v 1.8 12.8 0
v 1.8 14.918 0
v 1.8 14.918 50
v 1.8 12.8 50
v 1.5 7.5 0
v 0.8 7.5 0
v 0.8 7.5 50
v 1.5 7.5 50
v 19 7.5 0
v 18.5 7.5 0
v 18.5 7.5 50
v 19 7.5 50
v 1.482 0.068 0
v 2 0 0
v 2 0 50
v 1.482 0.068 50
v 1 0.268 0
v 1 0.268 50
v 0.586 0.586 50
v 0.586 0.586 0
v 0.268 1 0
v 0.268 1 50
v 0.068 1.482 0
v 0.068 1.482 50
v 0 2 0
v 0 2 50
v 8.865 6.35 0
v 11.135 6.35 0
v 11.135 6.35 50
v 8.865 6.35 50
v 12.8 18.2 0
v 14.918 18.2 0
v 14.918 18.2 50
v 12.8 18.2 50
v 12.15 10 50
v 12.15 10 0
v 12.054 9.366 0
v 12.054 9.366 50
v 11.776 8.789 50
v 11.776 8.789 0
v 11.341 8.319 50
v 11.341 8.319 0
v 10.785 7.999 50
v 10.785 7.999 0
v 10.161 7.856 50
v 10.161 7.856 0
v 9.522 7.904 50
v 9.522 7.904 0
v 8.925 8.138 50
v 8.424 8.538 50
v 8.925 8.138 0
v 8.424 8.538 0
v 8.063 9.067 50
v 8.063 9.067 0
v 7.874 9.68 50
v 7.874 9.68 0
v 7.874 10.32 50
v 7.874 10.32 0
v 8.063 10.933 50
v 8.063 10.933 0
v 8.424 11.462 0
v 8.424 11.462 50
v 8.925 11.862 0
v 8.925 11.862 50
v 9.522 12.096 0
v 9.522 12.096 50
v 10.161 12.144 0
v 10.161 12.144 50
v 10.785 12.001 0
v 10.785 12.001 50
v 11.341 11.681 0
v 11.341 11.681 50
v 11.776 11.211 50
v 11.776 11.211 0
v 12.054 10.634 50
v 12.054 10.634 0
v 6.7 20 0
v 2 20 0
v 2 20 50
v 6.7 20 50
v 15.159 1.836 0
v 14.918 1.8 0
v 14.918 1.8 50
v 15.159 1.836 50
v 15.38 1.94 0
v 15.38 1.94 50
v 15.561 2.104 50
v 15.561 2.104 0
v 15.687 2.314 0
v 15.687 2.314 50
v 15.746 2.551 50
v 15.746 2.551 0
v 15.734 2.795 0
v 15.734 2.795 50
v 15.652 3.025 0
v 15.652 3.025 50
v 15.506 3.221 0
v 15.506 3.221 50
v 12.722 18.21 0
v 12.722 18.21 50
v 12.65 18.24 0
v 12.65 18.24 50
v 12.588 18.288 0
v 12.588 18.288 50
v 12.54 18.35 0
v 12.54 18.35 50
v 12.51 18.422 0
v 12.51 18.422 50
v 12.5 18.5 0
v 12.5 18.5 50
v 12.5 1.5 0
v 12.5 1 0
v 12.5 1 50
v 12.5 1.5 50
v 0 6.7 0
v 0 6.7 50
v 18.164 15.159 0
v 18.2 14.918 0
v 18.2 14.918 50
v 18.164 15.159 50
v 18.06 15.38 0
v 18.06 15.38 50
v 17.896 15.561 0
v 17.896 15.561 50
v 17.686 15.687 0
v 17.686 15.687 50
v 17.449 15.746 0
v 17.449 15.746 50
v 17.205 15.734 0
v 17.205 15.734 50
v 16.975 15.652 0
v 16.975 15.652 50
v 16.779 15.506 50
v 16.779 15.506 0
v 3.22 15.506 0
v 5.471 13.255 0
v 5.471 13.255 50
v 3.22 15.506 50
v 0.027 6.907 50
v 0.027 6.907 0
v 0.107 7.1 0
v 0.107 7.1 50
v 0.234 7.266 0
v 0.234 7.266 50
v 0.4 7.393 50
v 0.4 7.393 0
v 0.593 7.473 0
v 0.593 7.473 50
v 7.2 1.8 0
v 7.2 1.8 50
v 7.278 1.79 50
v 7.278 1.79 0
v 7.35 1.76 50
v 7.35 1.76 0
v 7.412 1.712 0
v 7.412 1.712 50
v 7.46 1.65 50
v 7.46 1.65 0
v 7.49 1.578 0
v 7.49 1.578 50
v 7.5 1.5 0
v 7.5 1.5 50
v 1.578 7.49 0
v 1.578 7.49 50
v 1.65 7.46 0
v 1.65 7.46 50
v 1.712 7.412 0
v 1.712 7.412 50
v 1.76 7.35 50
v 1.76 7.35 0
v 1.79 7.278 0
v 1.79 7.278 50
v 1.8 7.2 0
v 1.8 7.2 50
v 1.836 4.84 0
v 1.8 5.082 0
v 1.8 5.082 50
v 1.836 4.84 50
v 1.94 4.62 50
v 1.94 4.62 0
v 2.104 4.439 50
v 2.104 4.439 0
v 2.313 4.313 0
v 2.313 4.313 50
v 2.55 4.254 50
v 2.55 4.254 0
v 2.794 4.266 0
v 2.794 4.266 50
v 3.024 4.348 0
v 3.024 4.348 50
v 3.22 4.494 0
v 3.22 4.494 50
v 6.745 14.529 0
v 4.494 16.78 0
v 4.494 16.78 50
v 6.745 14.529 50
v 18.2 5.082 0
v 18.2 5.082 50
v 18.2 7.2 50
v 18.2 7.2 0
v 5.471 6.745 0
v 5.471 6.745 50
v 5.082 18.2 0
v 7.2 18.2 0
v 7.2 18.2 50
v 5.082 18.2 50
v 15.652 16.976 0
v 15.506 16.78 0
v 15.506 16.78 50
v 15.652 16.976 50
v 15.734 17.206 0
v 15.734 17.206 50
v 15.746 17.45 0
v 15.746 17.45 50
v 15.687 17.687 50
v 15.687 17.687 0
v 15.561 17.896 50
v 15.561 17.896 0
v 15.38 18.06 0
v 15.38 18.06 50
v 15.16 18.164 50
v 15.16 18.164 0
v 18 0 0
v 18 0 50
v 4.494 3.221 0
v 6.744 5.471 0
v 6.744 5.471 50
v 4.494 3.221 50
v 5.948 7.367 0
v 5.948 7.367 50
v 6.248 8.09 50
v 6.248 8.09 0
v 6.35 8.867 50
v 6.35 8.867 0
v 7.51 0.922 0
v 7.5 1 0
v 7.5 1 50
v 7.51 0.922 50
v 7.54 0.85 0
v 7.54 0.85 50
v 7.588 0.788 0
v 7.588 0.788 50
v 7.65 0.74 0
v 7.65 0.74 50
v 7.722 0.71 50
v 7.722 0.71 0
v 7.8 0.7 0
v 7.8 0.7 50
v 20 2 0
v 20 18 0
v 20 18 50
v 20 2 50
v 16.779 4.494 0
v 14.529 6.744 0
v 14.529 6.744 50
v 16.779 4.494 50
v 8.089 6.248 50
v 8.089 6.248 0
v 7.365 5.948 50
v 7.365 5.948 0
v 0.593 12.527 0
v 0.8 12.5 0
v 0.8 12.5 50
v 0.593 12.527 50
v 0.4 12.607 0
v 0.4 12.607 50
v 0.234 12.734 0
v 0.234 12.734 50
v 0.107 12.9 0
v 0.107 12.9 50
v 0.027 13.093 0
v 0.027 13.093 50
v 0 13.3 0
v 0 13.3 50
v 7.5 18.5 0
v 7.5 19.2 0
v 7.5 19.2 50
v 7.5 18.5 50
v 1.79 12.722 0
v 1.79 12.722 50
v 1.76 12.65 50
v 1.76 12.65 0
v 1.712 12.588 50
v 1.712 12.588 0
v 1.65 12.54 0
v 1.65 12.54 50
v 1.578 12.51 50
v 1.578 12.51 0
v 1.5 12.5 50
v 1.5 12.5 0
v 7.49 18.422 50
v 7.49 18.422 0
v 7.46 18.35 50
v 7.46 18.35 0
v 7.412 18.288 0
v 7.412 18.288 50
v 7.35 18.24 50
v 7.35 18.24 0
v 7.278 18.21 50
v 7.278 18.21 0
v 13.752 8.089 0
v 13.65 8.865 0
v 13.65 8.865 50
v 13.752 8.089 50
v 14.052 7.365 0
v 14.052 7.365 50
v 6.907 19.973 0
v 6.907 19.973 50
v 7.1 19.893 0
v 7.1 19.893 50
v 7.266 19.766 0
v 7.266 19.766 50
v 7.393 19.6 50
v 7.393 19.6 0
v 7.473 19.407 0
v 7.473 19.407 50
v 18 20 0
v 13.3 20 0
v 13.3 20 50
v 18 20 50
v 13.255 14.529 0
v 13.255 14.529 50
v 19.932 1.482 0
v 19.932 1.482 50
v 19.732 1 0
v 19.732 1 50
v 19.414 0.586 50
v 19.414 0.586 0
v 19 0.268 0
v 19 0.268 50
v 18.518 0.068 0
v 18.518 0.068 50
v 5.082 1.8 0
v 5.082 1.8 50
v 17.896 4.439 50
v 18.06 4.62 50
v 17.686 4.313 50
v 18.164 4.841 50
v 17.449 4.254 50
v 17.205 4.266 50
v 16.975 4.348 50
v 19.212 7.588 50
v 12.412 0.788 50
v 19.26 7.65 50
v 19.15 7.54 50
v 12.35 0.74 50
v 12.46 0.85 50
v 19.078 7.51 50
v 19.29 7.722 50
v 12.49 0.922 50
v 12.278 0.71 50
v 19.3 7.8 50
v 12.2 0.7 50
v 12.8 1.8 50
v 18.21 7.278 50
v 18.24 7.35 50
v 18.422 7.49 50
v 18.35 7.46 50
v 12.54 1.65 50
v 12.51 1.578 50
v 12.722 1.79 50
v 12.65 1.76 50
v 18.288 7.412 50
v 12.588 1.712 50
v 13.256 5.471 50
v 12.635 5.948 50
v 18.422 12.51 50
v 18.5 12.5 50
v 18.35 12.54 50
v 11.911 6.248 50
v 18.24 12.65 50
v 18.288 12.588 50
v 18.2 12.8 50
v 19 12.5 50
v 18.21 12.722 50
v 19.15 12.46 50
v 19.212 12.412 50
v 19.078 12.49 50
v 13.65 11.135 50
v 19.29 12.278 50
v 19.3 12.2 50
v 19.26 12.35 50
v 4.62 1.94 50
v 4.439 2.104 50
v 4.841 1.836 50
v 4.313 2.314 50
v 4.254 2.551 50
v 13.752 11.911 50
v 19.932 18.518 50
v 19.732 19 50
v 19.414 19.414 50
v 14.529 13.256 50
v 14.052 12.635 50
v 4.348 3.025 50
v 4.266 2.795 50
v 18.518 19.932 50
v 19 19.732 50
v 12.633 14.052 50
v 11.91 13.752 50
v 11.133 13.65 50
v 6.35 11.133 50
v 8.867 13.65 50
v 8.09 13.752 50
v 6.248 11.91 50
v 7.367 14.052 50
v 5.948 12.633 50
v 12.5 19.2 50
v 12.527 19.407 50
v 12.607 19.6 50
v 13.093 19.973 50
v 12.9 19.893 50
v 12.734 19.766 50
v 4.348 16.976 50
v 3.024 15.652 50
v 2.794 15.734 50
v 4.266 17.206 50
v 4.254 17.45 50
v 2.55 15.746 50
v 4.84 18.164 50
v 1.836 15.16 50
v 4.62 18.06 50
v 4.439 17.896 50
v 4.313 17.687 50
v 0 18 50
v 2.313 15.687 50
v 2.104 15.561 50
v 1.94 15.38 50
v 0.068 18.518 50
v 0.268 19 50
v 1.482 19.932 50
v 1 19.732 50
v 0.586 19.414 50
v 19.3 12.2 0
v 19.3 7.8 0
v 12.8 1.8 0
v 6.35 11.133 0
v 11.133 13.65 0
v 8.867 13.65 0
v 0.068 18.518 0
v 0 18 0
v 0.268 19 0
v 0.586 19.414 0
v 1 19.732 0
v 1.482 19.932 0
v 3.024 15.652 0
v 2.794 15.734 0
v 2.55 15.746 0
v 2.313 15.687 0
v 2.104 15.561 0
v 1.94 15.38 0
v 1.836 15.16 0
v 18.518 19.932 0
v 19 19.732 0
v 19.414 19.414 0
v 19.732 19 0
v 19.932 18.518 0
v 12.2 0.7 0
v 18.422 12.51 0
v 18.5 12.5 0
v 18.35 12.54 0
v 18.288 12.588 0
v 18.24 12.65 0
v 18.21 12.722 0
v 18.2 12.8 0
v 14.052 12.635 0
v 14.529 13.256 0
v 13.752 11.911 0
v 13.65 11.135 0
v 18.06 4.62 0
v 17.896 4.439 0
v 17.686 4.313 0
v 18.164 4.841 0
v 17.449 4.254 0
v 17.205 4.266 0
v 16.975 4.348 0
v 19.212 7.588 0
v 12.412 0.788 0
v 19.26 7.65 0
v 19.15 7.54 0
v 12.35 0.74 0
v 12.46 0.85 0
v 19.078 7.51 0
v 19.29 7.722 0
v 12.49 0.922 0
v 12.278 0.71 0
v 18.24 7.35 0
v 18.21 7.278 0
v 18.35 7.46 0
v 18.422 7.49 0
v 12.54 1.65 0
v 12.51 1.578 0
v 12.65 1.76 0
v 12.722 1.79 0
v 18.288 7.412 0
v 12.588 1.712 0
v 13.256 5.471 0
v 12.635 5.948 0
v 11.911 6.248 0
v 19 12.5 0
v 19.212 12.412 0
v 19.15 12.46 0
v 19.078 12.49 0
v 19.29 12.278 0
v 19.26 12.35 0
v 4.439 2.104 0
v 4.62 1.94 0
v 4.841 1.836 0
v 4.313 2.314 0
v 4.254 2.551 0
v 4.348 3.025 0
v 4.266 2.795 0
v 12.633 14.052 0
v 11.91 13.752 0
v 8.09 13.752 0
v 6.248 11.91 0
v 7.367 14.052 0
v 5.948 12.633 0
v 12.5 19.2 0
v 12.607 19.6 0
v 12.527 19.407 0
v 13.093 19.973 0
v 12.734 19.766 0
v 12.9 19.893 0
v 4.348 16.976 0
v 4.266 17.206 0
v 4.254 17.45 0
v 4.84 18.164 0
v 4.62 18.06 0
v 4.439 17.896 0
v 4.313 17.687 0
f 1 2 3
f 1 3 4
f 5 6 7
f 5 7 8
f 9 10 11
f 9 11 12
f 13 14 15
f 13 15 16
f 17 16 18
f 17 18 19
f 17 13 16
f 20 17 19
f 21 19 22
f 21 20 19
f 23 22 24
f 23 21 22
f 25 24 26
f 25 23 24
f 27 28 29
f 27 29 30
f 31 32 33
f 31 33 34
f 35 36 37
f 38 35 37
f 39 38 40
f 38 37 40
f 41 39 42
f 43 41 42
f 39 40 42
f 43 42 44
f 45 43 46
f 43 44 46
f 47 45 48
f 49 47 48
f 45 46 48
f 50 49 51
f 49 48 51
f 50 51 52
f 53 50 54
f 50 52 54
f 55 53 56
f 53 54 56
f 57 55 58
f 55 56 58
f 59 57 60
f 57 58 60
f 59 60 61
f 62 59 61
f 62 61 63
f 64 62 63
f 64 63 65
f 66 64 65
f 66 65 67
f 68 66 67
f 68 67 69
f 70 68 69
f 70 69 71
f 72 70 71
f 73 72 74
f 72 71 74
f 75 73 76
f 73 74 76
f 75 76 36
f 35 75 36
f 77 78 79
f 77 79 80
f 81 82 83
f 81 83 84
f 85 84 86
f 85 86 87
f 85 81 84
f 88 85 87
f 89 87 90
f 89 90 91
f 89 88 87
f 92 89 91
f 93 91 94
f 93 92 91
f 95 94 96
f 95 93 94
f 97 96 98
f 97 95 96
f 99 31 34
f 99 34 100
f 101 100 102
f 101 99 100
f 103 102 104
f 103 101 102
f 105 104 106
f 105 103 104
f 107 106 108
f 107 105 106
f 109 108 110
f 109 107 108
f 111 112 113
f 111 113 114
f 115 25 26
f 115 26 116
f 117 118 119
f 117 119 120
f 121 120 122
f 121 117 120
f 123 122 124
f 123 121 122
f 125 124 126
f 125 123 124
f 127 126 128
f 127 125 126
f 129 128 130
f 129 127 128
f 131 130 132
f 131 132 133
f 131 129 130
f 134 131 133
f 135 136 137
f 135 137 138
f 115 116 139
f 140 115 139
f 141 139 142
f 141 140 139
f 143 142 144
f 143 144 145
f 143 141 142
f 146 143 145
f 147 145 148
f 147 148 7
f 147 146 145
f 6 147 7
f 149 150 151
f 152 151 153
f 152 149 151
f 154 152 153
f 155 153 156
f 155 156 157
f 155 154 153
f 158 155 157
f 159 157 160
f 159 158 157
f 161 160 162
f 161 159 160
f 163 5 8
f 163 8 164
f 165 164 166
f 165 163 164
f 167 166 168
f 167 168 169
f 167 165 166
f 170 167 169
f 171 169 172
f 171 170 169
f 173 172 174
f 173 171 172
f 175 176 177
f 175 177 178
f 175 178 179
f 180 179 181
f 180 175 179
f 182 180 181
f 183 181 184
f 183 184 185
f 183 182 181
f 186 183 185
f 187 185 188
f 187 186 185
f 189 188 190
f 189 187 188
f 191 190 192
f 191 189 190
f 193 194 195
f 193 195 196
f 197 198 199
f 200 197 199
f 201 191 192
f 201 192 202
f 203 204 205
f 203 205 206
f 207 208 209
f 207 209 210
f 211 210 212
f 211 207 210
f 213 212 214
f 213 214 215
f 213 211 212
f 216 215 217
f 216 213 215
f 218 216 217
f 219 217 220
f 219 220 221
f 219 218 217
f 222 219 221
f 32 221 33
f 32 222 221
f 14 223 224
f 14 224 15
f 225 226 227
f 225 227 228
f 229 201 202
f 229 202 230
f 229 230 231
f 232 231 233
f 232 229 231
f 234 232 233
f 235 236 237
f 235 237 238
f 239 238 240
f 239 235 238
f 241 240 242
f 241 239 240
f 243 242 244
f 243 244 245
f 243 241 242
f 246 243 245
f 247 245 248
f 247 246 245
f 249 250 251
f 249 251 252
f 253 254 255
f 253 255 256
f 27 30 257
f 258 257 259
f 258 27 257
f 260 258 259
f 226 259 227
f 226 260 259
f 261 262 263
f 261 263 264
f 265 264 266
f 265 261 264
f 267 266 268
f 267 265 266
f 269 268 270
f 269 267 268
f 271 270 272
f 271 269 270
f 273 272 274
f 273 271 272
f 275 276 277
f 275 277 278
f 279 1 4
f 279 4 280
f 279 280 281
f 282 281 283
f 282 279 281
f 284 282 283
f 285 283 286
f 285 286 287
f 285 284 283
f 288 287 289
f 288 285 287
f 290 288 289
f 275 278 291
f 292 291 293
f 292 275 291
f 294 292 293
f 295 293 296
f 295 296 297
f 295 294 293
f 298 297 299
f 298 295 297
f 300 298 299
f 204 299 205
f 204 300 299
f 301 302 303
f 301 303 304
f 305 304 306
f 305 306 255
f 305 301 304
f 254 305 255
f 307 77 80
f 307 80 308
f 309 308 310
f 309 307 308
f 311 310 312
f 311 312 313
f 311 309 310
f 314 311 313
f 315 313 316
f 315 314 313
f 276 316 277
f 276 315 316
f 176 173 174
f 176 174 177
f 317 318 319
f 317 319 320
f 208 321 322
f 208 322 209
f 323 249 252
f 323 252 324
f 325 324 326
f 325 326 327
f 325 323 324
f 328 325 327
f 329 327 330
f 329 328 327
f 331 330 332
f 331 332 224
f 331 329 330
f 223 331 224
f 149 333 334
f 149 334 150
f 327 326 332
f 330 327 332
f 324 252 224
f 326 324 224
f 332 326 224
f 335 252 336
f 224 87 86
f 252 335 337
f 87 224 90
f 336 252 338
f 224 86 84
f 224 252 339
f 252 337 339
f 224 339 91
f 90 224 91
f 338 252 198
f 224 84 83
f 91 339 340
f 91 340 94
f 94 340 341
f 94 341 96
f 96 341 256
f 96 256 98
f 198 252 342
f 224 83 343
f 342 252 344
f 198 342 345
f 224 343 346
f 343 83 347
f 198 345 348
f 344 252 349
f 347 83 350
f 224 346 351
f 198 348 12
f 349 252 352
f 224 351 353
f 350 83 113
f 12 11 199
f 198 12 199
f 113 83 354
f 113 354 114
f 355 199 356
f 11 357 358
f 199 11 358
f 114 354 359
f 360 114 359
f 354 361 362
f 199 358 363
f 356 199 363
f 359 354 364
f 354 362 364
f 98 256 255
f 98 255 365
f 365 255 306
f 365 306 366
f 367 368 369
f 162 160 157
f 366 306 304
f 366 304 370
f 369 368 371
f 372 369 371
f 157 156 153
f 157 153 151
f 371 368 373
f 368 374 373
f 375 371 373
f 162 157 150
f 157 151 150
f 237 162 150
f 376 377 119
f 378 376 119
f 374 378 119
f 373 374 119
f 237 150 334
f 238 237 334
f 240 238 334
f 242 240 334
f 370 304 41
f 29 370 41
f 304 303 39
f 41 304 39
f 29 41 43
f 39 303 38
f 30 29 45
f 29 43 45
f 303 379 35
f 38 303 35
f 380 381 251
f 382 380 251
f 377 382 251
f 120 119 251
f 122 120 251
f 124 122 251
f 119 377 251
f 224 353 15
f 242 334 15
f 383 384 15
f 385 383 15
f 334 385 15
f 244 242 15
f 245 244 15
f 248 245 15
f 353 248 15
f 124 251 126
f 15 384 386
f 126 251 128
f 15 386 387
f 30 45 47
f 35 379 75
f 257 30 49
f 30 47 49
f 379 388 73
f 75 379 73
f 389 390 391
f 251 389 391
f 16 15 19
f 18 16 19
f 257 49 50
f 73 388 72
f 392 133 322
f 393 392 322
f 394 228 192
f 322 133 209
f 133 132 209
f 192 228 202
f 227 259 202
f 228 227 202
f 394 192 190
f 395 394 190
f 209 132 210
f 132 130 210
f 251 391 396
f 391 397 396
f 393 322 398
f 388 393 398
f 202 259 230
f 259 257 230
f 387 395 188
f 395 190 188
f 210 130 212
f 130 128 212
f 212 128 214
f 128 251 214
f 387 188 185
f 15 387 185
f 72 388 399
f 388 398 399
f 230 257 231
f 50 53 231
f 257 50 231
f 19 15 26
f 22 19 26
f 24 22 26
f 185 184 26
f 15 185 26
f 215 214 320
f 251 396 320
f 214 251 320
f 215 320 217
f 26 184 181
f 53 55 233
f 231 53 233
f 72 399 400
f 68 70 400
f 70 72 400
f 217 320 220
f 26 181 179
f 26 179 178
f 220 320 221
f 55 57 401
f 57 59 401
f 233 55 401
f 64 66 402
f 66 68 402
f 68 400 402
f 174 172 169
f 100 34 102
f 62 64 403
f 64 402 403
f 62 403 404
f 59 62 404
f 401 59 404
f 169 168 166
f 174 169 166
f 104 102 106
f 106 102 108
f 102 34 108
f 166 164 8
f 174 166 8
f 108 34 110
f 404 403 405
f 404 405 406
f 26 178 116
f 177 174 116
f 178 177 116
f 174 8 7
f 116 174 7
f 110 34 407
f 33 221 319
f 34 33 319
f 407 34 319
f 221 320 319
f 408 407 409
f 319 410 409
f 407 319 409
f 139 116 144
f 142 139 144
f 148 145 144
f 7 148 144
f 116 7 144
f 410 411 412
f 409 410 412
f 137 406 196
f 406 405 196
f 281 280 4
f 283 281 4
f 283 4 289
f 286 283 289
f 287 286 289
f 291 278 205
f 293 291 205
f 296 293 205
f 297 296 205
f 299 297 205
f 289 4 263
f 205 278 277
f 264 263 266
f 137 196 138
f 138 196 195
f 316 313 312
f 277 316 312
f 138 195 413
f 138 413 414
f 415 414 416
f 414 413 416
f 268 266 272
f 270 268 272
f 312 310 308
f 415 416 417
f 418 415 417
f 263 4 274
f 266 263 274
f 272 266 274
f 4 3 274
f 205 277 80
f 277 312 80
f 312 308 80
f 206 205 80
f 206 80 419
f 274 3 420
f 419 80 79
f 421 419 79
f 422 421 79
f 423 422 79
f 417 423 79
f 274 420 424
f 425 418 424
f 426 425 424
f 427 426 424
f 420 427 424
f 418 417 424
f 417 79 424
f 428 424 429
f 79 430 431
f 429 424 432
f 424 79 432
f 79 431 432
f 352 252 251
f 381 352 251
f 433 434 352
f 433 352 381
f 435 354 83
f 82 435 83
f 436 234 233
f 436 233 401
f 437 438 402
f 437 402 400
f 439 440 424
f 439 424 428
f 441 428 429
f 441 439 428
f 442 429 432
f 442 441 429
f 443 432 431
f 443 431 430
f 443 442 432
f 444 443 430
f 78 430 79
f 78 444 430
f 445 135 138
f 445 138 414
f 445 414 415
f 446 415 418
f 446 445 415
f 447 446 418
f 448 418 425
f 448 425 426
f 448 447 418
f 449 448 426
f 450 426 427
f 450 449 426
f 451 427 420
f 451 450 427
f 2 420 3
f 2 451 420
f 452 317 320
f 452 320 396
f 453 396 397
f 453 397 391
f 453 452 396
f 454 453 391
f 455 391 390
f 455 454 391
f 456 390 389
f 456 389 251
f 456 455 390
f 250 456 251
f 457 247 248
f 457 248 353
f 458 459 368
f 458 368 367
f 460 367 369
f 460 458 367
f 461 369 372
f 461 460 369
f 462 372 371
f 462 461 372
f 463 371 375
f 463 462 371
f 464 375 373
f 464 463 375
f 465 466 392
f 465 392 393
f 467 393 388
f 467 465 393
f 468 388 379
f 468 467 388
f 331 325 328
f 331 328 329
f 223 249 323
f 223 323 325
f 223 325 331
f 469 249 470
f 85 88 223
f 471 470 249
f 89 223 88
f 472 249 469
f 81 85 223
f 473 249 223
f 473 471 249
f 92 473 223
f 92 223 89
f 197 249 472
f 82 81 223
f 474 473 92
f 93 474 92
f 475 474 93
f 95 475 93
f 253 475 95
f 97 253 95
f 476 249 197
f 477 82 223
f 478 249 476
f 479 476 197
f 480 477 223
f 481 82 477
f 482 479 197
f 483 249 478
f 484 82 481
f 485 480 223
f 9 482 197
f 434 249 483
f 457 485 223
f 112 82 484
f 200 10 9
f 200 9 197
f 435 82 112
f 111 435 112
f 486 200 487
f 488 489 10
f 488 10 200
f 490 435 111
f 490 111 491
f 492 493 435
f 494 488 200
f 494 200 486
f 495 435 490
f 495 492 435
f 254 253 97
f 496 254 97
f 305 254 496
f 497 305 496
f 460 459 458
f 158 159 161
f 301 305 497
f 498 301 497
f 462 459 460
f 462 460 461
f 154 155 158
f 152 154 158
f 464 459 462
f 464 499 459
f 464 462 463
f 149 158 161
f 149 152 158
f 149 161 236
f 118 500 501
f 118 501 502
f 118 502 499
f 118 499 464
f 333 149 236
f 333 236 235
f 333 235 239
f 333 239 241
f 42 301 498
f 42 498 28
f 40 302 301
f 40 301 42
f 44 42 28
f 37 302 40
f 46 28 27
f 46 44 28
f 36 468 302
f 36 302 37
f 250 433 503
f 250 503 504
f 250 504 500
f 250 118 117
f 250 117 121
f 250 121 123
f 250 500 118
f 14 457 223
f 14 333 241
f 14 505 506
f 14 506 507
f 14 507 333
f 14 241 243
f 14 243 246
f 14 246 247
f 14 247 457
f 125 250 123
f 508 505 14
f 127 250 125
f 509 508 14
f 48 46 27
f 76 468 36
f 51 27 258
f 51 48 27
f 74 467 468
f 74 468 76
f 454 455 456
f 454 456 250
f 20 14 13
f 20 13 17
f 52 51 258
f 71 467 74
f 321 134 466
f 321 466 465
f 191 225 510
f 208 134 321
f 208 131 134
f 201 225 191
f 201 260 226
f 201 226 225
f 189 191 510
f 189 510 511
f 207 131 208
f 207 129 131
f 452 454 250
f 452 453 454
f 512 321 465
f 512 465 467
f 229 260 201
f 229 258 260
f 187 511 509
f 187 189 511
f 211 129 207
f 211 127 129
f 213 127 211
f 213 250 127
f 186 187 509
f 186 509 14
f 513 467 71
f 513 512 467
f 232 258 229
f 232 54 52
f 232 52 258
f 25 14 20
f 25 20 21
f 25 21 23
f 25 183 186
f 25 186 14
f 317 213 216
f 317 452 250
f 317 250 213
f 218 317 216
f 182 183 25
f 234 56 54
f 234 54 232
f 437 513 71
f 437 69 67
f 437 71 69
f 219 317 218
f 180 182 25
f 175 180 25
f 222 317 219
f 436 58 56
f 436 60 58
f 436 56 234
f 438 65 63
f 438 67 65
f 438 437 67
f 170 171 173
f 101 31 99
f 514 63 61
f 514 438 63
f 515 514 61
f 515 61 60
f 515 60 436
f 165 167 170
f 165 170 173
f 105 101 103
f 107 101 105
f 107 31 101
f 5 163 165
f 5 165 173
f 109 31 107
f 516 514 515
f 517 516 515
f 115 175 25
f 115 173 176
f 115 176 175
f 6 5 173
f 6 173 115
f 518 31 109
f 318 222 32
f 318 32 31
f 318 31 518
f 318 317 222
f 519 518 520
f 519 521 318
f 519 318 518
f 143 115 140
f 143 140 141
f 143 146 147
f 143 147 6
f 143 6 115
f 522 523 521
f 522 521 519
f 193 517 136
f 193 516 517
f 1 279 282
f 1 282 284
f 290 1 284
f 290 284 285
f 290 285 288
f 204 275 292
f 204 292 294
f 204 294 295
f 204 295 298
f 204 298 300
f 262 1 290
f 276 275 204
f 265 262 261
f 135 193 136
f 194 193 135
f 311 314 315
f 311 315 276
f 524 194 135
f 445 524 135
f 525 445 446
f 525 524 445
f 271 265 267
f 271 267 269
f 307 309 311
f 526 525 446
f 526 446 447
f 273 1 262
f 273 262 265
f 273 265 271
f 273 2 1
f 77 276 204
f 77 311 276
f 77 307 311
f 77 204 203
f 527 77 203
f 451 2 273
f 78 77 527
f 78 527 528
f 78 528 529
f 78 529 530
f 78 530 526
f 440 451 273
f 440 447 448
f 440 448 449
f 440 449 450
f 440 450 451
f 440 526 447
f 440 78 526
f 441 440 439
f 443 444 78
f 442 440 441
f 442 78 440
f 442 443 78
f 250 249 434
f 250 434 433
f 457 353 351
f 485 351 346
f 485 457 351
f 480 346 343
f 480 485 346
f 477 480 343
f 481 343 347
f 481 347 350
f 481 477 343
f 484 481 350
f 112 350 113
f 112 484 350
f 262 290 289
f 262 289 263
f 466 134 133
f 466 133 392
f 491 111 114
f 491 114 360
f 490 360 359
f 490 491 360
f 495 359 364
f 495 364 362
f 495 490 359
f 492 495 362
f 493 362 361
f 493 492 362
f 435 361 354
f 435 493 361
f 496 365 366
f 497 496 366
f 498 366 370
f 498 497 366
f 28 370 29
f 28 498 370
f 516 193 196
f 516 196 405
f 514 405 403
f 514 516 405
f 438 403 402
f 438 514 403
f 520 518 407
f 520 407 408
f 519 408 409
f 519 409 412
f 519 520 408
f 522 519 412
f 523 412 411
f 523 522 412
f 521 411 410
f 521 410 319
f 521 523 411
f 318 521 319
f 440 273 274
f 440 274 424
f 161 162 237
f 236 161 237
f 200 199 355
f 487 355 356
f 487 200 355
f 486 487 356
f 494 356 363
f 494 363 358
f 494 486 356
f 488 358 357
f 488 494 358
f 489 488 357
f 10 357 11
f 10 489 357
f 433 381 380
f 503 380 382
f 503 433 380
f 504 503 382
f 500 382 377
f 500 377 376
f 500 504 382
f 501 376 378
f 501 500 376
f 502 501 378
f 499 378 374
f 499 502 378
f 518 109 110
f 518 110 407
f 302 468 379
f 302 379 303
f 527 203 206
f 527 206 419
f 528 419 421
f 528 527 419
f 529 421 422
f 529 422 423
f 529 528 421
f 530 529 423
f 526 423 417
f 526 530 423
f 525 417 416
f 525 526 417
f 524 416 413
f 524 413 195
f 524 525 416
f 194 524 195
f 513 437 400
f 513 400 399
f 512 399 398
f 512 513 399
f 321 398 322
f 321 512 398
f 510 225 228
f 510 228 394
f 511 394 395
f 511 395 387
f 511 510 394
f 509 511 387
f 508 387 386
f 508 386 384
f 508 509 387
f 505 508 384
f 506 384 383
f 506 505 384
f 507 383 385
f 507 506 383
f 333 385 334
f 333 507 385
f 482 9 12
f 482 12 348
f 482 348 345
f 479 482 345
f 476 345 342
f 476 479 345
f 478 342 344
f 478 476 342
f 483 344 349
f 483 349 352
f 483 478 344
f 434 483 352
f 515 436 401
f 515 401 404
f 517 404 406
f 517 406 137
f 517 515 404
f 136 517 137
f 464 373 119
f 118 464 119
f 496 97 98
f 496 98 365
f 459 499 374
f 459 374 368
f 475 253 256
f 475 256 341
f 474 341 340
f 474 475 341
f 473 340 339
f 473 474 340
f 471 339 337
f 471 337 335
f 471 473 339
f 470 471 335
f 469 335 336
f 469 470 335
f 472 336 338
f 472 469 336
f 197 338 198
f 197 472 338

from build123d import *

# Parameters (mm, degrees)
ESQUISSE1_R        = 2.15
BOSS_EXTRU_1_DEPTH = 50


with BuildPart() as part:
    # Esquisse1 → Boss.-Extru.1 (new body)
    with BuildSketch(Plane(origin=(0, 0, 0), x_dir=(-1, 0, 0), z_dir=(0, 0, -1))):
        with BuildLine():
            Line((-17.999994246, 0), (-1.999994246, 0))
            ThreePointArc((-1.999994246, 0), (-0.585780683, 0.585786438), (5.754e-06, 2))
            Line((5.754e-06, 2), (5.754e-06, 6.699994246))
            ThreePointArc((5.754e-06, 6.699994246), (-0.234308821, 7.265679671), (-0.799994246, 7.499994246))
            Line((-0.799994246, 7.499994246), (-1.499994246, 7.499994246))
            ThreePointArc((-1.499994246, 7.499994246), (-1.71212628, 7.41212628), (-1.799994246, 7.199994246))
            Line((-1.799994246, 7.199994246), (-1.799994246, 5.081575939))
            ThreePointArc((-1.799994246, 5.081575939), (-2.31333985, 4.313299949), (-3.21958317, 4.493562953))
            Line((-3.21958317, 4.493562953), (-5.471314589, 6.745294373))
            ThreePointArc((-5.471314589, 6.745294373), (-6.121632843, 7.718564419), (-6.349994246, 8.866614716))
            Line((-6.349994246, 8.866614716), (-6.349994246, 11.133385284))
            ThreePointArc((-6.349994246, 11.133385284), (-6.121632843, 12.281435581), (-5.471314589, 13.254705627))
            Line((-5.471314589, 13.254705627), (-3.21958317, 15.506437047))
            ThreePointArc((-3.21958317, 15.506437047), (-2.31333985, 15.686700051), (-1.799994246, 14.918424061))
            Line((-1.799994246, 14.918424061), (-1.799994246, 12.799994246))
            ThreePointArc((-1.799994246, 12.799994246), (-1.71212628, 12.587862211), (-1.499994246, 12.499994246))
            Line((-1.499994246, 12.499994246), (-0.799994246, 12.499994246))
            ThreePointArc((-0.799994246, 12.499994246), (-0.234308821, 12.734308821), (5.754e-06, 13.299994246))
            Line((5.754e-06, 13.299994246), (5.754e-06, 18))
            ThreePointArc((5.754e-06, 18), (-0.585780683, 19.414213562), (-1.999994246, 20))
            Line((-1.999994246, 20), (-6.699994246, 20))
            ThreePointArc((-6.699994246, 20), (-7.265679671, 19.765685425), (-7.499994246, 19.2))
            Line((-7.499994246, 19.2), (-7.499994246, 18.5))
            ThreePointArc((-7.499994246, 18.5), (-7.41212628, 18.287867966), (-7.199994246, 18.2))
            Line((-7.199994246, 18.2), (-5.081570185, 18.2))
            ThreePointArc((-5.081570185, 18.2), (-4.313294195, 17.686654396), (-4.493557199, 16.780411076))
            Line((-4.493557199, 16.780411076), (-6.745288618, 14.528679656))
            ThreePointArc((-6.745288618, 14.528679656), (-7.718558665, 13.878361402), (-8.866608962, 13.65))
            Line((-8.866608962, 13.65), (-11.13337953, 13.65))
            ThreePointArc((-11.13337953, 13.65), (-12.281429827, 13.878361402), (-13.254699873, 14.528679656))
            Line((-13.254699873, 14.528679656), (-15.506431292, 16.780411076))
            ThreePointArc((-15.506431292, 16.780411076), (-15.686694297, 17.686654396), (-14.918418307, 18.2))
            Line((-14.918418307, 18.2), (-12.799994246, 18.2))
            ThreePointArc((-12.799994246, 18.2), (-12.587862211, 18.287867966), (-12.499994246, 18.5))
            Line((-12.499994246, 18.5), (-12.499994246, 19.2))
            ThreePointArc((-12.499994246, 19.2), (-12.734308821, 19.765685425), (-13.299994246, 20))
            Line((-13.299994246, 20), (-17.999994246, 20))
            ThreePointArc((-17.999994246, 20), (-19.414207808, 19.414213562), (-19.999994246, 18))
            Line((-19.999994246, 18), (-19.999994246, 2))
            ThreePointArc((-19.999994246, 2), (-19.414207808, 0.585786438), (-17.999994246, 0))
        make_face()
        with Locations(Location((-10, 10, 0), (0, 0, 180))):
            Circle(ESQUISSE1_R, mode=Mode.SUBTRACT)
        with BuildLine():
            Line((-16.778984489, 15.506192283), (-14.528680848, 13.255888642))
            ThreePointArc((-14.528680848, 13.255888642), (-13.878362594, 12.282618596), (-13.650001192, 11.134568298))
            Line((-13.650001192, 11.134568298), (-13.650001192, 8.865430016))
            ThreePointArc((-13.650001192, 8.865430016), (-13.878362594, 7.717379719), (-14.528680848, 6.744109673))
            Line((-14.528680848, 6.744109673), (-16.778991435, 4.493799086))
            ThreePointArc((-16.778991435, 4.493799086), (-17.686141031, 4.313355812), (-18.2, 5.082400105))
            Line((-18.2, 5.082400105), (-18.2, 7.199994246))
            ThreePointArc((-18.2, 7.199994246), (-18.287867966, 7.41212628), (-18.5, 7.499994246))
            Line((-18.5, 7.499994246), (-19, 7.499994246))
            ThreePointArc((-19, 7.499994246), (-19.212132034, 7.587862211), (-19.3, 7.799994246))
            Line((-19.3, 7.799994246), (-19.3, 12.199994246))
            ThreePointArc((-19.3, 12.199994246), (-19.212132034, 12.41212628), (-19, 12.499994246))
            Line((-19, 12.499994246), (-18.5, 12.499994246))
            ThreePointArc((-18.5, 12.499994246), (-18.287867966, 12.587862211), (-18.2, 12.799994246))
            Line((-18.2, 12.799994246), (-18.2, 14.917588386))
            ThreePointArc((-18.2, 14.917588386), (-17.68613852, 15.686636439), (-16.778984489, 15.506192283))
        make_face(mode=Mode.SUBTRACT)
        with BuildLine():
            Line((-15.506192283, 3.221015511), (-13.25588745, 5.471320344))
            ThreePointArc((-13.25588745, 5.471320344), (-12.282617404, 6.121638598), (-11.134567107, 6.35))
            Line((-11.134567107, 6.35), (-8.865432893, 6.35))
            ThreePointArc((-8.865432893, 6.35), (-7.717382596, 6.121638598), (-6.74411255, 5.471320344))
            Line((-6.74411255, 5.471320344), (-4.493800771, 3.221008565))
            ThreePointArc((-4.493800771, 3.221008565), (-4.313357497, 2.313858969), (-5.082401791, 1.8))
            Line((-5.082401791, 1.8), (-7.199994246, 1.8))
            ThreePointArc((-7.199994246, 1.8), (-7.41212628, 1.712132034), (-7.499994246, 1.5))
            Line((-7.499994246, 1.5), (-7.499994246, 1))
            ThreePointArc((-7.499994246, 1), (-7.587862211, 0.787867966), (-7.799994246, 0.7))
            Line((-7.799994246, 0.7), (-12.199994246, 0.7))
            ThreePointArc((-12.199994246, 0.7), (-12.41212628, 0.787867966), (-12.499994246, 1))
            Line((-12.499994246, 1), (-12.499994246, 1.5))
            ThreePointArc((-12.499994246, 1.5), (-12.587862211, 1.712132034), (-12.799994246, 1.8))
            Line((-12.799994246, 1.8), (-14.917588386, 1.8))
            ThreePointArc((-14.917588386, 1.8), (-15.686636439, 2.31386148), (-15.506192283, 3.221015511))
        make_face(mode=Mode.SUBTRACT)
    extrude(amount=-BOSS_EXTRU_1_DEPTH)


solid = part.part
